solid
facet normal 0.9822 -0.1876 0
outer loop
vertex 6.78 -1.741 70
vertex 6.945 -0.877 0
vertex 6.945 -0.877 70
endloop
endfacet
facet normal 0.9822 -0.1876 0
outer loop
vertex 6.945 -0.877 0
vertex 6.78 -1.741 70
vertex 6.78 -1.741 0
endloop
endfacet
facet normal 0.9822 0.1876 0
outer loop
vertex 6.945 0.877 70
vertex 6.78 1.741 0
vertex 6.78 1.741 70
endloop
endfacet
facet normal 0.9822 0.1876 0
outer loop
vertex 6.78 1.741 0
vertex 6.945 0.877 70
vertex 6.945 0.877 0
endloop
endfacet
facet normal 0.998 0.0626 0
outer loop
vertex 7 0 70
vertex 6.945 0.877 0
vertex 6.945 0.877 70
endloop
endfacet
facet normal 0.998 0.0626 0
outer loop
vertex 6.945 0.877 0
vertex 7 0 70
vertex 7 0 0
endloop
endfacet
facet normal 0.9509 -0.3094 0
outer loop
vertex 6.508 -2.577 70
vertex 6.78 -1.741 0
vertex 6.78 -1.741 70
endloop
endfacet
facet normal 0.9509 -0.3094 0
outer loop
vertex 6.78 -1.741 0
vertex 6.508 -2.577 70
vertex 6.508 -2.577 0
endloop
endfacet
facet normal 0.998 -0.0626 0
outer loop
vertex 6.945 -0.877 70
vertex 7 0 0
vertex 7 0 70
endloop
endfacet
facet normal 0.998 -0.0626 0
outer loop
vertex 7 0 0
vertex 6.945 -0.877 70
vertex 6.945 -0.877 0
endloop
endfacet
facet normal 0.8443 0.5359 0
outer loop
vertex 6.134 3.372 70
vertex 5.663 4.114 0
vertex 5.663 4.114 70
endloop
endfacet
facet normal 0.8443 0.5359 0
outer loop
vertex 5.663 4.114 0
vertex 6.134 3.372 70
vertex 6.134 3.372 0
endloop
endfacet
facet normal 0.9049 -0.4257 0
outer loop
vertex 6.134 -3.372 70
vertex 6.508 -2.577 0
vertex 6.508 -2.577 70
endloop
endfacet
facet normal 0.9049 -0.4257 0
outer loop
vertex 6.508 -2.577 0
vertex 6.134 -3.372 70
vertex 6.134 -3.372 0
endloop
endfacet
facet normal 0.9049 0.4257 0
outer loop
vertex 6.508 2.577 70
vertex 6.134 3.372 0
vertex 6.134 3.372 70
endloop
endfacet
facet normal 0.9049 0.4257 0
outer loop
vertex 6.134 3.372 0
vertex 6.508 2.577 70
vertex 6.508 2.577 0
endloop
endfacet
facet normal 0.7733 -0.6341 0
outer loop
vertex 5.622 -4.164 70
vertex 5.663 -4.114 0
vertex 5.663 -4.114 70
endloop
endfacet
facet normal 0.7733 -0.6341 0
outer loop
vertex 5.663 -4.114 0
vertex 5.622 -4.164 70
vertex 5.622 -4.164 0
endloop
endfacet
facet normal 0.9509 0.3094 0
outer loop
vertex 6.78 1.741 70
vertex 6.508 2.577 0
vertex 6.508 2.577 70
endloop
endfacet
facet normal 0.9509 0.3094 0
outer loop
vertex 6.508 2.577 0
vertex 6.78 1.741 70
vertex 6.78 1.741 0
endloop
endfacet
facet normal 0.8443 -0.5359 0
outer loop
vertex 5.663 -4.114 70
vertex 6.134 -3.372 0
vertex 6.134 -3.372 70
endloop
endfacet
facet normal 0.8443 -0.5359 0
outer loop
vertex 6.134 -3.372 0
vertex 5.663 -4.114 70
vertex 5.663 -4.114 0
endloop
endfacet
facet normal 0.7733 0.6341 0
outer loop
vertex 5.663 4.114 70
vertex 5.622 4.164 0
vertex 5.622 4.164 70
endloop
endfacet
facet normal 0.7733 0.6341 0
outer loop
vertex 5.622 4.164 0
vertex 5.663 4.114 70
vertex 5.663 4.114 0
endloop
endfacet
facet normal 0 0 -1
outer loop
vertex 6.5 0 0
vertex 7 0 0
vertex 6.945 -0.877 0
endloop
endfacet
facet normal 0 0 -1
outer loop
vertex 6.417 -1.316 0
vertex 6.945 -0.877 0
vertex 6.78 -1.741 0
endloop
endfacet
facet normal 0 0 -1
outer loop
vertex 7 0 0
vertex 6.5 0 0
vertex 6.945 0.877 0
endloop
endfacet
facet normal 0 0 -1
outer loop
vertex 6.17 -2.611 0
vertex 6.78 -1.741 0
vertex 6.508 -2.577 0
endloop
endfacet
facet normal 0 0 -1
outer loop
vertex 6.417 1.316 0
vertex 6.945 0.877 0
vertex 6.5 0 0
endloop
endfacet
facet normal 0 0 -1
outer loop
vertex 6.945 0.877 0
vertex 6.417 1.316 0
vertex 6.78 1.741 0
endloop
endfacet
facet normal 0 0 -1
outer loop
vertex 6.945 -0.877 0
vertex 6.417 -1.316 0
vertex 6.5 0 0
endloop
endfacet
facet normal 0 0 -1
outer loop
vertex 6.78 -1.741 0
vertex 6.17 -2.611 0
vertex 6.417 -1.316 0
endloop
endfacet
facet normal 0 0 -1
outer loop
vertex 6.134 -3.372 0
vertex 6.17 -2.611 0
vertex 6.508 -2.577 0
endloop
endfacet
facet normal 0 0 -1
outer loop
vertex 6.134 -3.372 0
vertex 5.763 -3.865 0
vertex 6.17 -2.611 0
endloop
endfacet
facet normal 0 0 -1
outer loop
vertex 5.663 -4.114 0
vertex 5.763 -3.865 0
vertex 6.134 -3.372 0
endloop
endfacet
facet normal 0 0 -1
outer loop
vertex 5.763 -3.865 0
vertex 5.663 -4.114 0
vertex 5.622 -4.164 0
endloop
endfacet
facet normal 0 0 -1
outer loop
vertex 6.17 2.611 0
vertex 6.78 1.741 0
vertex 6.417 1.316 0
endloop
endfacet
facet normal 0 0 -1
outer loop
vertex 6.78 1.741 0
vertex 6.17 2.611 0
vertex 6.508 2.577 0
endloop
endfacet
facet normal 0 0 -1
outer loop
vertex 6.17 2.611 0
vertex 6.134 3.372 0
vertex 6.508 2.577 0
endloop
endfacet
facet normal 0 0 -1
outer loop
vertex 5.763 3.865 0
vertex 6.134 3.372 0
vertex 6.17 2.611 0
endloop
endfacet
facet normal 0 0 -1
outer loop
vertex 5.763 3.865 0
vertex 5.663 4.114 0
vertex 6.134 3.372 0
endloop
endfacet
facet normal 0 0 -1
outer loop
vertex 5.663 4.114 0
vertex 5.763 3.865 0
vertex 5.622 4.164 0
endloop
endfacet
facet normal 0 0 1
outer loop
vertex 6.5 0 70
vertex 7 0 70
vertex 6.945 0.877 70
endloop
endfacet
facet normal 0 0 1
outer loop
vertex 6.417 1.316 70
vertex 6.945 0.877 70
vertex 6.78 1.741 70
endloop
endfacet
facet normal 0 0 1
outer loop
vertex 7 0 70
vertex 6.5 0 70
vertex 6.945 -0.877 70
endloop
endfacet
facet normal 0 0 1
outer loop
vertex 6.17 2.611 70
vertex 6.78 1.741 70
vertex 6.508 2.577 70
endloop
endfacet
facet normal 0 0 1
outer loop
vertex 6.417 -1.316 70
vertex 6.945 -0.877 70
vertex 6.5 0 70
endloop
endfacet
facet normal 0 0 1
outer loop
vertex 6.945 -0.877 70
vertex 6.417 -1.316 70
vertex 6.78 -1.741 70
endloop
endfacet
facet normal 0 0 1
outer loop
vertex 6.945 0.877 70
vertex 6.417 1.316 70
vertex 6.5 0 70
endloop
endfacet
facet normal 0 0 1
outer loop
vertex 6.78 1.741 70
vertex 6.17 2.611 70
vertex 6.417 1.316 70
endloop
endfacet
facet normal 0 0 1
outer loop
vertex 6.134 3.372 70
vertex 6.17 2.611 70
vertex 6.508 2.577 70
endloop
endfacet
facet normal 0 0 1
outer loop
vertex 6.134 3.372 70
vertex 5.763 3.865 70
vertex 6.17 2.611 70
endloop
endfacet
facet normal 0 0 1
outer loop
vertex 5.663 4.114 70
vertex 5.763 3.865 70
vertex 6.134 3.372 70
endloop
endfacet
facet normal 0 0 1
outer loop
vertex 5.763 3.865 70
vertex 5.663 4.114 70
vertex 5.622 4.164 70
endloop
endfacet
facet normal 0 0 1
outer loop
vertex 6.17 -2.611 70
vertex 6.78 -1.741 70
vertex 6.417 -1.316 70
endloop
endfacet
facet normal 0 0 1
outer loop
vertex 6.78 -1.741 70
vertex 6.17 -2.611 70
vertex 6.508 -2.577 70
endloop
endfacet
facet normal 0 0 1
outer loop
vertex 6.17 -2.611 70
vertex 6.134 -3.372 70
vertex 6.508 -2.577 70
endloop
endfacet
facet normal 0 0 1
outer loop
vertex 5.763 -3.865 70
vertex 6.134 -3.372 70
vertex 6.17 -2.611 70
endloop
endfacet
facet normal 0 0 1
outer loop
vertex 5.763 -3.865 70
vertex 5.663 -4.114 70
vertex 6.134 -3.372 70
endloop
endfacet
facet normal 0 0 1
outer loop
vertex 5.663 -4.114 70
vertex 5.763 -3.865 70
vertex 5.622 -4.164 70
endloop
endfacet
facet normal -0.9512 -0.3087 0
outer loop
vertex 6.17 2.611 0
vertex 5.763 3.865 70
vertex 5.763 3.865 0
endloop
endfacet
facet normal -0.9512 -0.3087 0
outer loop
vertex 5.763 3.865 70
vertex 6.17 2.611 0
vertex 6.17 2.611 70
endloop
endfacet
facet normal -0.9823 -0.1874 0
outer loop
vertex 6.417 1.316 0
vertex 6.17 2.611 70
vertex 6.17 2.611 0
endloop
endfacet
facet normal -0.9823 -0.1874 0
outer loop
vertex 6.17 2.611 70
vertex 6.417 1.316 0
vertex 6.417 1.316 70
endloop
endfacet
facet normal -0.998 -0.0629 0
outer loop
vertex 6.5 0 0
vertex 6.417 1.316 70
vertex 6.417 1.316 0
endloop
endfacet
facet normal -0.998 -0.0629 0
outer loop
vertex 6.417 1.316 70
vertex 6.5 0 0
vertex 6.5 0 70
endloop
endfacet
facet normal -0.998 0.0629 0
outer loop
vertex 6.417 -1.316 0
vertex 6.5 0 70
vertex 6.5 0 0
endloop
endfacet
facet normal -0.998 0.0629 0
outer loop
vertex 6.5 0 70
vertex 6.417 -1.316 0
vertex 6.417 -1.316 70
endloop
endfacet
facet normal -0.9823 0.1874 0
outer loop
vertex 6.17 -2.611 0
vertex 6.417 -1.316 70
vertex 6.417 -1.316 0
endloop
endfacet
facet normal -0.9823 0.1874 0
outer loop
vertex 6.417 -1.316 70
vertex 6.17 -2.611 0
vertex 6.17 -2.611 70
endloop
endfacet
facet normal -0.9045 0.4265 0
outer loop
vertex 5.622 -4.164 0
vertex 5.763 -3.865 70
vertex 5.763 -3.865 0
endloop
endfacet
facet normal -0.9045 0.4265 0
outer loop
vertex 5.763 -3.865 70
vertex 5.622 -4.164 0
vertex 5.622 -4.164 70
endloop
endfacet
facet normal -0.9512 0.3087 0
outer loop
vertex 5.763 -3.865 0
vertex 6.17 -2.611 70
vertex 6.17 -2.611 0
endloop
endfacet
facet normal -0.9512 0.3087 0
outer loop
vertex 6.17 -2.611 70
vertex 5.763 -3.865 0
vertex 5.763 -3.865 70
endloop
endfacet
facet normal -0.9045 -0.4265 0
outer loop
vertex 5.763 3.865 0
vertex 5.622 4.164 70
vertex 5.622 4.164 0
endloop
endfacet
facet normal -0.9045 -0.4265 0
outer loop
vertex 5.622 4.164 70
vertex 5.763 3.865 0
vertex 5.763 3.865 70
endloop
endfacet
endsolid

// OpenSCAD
$fn = 50;


difference() {
	union() {
		cylinder(h = 70, r = 7.0000000000);
		translate(v = [-7.0000000000, 0, 0]) {
			cylinder(h = 70, r = 7.0000000000);
		}
	}
	union() {
		cylinder(h = 70, r = 3.2500000000);
		cylinder(h = 70, r = 1.8000000000);
		cylinder(h = 70, r = 1.8000000000);
		cylinder(h = 70, r = 1.8000000000);
		translate(v = [-11.5000000000, 0, 0]) {
			hull() {
				translate(v = [-3.7500000000, 0.0000000000, 0]) {
					cylinder(h = 70, r = 10.5000000000);
				}
				translate(v = [3.7500000000, 0.0000000000, 0]) {
					cylinder(h = 70, r = 10.5000000000);
				}
				translate(v = [-3.7500000000, -0.0000000000, 0]) {
					cylinder(h = 70, r = 10.5000000000);
				}
				translate(v = [3.7500000000, -0.0000000000, 0]) {
					cylinder(h = 70, r = 10.5000000000);
				}
			}
		}
		translate(v = [-4.0000000000, 0, 0.0000000000]) {
			cylinder(h = 70, r = 10.5000000000);
		}
	}
}
